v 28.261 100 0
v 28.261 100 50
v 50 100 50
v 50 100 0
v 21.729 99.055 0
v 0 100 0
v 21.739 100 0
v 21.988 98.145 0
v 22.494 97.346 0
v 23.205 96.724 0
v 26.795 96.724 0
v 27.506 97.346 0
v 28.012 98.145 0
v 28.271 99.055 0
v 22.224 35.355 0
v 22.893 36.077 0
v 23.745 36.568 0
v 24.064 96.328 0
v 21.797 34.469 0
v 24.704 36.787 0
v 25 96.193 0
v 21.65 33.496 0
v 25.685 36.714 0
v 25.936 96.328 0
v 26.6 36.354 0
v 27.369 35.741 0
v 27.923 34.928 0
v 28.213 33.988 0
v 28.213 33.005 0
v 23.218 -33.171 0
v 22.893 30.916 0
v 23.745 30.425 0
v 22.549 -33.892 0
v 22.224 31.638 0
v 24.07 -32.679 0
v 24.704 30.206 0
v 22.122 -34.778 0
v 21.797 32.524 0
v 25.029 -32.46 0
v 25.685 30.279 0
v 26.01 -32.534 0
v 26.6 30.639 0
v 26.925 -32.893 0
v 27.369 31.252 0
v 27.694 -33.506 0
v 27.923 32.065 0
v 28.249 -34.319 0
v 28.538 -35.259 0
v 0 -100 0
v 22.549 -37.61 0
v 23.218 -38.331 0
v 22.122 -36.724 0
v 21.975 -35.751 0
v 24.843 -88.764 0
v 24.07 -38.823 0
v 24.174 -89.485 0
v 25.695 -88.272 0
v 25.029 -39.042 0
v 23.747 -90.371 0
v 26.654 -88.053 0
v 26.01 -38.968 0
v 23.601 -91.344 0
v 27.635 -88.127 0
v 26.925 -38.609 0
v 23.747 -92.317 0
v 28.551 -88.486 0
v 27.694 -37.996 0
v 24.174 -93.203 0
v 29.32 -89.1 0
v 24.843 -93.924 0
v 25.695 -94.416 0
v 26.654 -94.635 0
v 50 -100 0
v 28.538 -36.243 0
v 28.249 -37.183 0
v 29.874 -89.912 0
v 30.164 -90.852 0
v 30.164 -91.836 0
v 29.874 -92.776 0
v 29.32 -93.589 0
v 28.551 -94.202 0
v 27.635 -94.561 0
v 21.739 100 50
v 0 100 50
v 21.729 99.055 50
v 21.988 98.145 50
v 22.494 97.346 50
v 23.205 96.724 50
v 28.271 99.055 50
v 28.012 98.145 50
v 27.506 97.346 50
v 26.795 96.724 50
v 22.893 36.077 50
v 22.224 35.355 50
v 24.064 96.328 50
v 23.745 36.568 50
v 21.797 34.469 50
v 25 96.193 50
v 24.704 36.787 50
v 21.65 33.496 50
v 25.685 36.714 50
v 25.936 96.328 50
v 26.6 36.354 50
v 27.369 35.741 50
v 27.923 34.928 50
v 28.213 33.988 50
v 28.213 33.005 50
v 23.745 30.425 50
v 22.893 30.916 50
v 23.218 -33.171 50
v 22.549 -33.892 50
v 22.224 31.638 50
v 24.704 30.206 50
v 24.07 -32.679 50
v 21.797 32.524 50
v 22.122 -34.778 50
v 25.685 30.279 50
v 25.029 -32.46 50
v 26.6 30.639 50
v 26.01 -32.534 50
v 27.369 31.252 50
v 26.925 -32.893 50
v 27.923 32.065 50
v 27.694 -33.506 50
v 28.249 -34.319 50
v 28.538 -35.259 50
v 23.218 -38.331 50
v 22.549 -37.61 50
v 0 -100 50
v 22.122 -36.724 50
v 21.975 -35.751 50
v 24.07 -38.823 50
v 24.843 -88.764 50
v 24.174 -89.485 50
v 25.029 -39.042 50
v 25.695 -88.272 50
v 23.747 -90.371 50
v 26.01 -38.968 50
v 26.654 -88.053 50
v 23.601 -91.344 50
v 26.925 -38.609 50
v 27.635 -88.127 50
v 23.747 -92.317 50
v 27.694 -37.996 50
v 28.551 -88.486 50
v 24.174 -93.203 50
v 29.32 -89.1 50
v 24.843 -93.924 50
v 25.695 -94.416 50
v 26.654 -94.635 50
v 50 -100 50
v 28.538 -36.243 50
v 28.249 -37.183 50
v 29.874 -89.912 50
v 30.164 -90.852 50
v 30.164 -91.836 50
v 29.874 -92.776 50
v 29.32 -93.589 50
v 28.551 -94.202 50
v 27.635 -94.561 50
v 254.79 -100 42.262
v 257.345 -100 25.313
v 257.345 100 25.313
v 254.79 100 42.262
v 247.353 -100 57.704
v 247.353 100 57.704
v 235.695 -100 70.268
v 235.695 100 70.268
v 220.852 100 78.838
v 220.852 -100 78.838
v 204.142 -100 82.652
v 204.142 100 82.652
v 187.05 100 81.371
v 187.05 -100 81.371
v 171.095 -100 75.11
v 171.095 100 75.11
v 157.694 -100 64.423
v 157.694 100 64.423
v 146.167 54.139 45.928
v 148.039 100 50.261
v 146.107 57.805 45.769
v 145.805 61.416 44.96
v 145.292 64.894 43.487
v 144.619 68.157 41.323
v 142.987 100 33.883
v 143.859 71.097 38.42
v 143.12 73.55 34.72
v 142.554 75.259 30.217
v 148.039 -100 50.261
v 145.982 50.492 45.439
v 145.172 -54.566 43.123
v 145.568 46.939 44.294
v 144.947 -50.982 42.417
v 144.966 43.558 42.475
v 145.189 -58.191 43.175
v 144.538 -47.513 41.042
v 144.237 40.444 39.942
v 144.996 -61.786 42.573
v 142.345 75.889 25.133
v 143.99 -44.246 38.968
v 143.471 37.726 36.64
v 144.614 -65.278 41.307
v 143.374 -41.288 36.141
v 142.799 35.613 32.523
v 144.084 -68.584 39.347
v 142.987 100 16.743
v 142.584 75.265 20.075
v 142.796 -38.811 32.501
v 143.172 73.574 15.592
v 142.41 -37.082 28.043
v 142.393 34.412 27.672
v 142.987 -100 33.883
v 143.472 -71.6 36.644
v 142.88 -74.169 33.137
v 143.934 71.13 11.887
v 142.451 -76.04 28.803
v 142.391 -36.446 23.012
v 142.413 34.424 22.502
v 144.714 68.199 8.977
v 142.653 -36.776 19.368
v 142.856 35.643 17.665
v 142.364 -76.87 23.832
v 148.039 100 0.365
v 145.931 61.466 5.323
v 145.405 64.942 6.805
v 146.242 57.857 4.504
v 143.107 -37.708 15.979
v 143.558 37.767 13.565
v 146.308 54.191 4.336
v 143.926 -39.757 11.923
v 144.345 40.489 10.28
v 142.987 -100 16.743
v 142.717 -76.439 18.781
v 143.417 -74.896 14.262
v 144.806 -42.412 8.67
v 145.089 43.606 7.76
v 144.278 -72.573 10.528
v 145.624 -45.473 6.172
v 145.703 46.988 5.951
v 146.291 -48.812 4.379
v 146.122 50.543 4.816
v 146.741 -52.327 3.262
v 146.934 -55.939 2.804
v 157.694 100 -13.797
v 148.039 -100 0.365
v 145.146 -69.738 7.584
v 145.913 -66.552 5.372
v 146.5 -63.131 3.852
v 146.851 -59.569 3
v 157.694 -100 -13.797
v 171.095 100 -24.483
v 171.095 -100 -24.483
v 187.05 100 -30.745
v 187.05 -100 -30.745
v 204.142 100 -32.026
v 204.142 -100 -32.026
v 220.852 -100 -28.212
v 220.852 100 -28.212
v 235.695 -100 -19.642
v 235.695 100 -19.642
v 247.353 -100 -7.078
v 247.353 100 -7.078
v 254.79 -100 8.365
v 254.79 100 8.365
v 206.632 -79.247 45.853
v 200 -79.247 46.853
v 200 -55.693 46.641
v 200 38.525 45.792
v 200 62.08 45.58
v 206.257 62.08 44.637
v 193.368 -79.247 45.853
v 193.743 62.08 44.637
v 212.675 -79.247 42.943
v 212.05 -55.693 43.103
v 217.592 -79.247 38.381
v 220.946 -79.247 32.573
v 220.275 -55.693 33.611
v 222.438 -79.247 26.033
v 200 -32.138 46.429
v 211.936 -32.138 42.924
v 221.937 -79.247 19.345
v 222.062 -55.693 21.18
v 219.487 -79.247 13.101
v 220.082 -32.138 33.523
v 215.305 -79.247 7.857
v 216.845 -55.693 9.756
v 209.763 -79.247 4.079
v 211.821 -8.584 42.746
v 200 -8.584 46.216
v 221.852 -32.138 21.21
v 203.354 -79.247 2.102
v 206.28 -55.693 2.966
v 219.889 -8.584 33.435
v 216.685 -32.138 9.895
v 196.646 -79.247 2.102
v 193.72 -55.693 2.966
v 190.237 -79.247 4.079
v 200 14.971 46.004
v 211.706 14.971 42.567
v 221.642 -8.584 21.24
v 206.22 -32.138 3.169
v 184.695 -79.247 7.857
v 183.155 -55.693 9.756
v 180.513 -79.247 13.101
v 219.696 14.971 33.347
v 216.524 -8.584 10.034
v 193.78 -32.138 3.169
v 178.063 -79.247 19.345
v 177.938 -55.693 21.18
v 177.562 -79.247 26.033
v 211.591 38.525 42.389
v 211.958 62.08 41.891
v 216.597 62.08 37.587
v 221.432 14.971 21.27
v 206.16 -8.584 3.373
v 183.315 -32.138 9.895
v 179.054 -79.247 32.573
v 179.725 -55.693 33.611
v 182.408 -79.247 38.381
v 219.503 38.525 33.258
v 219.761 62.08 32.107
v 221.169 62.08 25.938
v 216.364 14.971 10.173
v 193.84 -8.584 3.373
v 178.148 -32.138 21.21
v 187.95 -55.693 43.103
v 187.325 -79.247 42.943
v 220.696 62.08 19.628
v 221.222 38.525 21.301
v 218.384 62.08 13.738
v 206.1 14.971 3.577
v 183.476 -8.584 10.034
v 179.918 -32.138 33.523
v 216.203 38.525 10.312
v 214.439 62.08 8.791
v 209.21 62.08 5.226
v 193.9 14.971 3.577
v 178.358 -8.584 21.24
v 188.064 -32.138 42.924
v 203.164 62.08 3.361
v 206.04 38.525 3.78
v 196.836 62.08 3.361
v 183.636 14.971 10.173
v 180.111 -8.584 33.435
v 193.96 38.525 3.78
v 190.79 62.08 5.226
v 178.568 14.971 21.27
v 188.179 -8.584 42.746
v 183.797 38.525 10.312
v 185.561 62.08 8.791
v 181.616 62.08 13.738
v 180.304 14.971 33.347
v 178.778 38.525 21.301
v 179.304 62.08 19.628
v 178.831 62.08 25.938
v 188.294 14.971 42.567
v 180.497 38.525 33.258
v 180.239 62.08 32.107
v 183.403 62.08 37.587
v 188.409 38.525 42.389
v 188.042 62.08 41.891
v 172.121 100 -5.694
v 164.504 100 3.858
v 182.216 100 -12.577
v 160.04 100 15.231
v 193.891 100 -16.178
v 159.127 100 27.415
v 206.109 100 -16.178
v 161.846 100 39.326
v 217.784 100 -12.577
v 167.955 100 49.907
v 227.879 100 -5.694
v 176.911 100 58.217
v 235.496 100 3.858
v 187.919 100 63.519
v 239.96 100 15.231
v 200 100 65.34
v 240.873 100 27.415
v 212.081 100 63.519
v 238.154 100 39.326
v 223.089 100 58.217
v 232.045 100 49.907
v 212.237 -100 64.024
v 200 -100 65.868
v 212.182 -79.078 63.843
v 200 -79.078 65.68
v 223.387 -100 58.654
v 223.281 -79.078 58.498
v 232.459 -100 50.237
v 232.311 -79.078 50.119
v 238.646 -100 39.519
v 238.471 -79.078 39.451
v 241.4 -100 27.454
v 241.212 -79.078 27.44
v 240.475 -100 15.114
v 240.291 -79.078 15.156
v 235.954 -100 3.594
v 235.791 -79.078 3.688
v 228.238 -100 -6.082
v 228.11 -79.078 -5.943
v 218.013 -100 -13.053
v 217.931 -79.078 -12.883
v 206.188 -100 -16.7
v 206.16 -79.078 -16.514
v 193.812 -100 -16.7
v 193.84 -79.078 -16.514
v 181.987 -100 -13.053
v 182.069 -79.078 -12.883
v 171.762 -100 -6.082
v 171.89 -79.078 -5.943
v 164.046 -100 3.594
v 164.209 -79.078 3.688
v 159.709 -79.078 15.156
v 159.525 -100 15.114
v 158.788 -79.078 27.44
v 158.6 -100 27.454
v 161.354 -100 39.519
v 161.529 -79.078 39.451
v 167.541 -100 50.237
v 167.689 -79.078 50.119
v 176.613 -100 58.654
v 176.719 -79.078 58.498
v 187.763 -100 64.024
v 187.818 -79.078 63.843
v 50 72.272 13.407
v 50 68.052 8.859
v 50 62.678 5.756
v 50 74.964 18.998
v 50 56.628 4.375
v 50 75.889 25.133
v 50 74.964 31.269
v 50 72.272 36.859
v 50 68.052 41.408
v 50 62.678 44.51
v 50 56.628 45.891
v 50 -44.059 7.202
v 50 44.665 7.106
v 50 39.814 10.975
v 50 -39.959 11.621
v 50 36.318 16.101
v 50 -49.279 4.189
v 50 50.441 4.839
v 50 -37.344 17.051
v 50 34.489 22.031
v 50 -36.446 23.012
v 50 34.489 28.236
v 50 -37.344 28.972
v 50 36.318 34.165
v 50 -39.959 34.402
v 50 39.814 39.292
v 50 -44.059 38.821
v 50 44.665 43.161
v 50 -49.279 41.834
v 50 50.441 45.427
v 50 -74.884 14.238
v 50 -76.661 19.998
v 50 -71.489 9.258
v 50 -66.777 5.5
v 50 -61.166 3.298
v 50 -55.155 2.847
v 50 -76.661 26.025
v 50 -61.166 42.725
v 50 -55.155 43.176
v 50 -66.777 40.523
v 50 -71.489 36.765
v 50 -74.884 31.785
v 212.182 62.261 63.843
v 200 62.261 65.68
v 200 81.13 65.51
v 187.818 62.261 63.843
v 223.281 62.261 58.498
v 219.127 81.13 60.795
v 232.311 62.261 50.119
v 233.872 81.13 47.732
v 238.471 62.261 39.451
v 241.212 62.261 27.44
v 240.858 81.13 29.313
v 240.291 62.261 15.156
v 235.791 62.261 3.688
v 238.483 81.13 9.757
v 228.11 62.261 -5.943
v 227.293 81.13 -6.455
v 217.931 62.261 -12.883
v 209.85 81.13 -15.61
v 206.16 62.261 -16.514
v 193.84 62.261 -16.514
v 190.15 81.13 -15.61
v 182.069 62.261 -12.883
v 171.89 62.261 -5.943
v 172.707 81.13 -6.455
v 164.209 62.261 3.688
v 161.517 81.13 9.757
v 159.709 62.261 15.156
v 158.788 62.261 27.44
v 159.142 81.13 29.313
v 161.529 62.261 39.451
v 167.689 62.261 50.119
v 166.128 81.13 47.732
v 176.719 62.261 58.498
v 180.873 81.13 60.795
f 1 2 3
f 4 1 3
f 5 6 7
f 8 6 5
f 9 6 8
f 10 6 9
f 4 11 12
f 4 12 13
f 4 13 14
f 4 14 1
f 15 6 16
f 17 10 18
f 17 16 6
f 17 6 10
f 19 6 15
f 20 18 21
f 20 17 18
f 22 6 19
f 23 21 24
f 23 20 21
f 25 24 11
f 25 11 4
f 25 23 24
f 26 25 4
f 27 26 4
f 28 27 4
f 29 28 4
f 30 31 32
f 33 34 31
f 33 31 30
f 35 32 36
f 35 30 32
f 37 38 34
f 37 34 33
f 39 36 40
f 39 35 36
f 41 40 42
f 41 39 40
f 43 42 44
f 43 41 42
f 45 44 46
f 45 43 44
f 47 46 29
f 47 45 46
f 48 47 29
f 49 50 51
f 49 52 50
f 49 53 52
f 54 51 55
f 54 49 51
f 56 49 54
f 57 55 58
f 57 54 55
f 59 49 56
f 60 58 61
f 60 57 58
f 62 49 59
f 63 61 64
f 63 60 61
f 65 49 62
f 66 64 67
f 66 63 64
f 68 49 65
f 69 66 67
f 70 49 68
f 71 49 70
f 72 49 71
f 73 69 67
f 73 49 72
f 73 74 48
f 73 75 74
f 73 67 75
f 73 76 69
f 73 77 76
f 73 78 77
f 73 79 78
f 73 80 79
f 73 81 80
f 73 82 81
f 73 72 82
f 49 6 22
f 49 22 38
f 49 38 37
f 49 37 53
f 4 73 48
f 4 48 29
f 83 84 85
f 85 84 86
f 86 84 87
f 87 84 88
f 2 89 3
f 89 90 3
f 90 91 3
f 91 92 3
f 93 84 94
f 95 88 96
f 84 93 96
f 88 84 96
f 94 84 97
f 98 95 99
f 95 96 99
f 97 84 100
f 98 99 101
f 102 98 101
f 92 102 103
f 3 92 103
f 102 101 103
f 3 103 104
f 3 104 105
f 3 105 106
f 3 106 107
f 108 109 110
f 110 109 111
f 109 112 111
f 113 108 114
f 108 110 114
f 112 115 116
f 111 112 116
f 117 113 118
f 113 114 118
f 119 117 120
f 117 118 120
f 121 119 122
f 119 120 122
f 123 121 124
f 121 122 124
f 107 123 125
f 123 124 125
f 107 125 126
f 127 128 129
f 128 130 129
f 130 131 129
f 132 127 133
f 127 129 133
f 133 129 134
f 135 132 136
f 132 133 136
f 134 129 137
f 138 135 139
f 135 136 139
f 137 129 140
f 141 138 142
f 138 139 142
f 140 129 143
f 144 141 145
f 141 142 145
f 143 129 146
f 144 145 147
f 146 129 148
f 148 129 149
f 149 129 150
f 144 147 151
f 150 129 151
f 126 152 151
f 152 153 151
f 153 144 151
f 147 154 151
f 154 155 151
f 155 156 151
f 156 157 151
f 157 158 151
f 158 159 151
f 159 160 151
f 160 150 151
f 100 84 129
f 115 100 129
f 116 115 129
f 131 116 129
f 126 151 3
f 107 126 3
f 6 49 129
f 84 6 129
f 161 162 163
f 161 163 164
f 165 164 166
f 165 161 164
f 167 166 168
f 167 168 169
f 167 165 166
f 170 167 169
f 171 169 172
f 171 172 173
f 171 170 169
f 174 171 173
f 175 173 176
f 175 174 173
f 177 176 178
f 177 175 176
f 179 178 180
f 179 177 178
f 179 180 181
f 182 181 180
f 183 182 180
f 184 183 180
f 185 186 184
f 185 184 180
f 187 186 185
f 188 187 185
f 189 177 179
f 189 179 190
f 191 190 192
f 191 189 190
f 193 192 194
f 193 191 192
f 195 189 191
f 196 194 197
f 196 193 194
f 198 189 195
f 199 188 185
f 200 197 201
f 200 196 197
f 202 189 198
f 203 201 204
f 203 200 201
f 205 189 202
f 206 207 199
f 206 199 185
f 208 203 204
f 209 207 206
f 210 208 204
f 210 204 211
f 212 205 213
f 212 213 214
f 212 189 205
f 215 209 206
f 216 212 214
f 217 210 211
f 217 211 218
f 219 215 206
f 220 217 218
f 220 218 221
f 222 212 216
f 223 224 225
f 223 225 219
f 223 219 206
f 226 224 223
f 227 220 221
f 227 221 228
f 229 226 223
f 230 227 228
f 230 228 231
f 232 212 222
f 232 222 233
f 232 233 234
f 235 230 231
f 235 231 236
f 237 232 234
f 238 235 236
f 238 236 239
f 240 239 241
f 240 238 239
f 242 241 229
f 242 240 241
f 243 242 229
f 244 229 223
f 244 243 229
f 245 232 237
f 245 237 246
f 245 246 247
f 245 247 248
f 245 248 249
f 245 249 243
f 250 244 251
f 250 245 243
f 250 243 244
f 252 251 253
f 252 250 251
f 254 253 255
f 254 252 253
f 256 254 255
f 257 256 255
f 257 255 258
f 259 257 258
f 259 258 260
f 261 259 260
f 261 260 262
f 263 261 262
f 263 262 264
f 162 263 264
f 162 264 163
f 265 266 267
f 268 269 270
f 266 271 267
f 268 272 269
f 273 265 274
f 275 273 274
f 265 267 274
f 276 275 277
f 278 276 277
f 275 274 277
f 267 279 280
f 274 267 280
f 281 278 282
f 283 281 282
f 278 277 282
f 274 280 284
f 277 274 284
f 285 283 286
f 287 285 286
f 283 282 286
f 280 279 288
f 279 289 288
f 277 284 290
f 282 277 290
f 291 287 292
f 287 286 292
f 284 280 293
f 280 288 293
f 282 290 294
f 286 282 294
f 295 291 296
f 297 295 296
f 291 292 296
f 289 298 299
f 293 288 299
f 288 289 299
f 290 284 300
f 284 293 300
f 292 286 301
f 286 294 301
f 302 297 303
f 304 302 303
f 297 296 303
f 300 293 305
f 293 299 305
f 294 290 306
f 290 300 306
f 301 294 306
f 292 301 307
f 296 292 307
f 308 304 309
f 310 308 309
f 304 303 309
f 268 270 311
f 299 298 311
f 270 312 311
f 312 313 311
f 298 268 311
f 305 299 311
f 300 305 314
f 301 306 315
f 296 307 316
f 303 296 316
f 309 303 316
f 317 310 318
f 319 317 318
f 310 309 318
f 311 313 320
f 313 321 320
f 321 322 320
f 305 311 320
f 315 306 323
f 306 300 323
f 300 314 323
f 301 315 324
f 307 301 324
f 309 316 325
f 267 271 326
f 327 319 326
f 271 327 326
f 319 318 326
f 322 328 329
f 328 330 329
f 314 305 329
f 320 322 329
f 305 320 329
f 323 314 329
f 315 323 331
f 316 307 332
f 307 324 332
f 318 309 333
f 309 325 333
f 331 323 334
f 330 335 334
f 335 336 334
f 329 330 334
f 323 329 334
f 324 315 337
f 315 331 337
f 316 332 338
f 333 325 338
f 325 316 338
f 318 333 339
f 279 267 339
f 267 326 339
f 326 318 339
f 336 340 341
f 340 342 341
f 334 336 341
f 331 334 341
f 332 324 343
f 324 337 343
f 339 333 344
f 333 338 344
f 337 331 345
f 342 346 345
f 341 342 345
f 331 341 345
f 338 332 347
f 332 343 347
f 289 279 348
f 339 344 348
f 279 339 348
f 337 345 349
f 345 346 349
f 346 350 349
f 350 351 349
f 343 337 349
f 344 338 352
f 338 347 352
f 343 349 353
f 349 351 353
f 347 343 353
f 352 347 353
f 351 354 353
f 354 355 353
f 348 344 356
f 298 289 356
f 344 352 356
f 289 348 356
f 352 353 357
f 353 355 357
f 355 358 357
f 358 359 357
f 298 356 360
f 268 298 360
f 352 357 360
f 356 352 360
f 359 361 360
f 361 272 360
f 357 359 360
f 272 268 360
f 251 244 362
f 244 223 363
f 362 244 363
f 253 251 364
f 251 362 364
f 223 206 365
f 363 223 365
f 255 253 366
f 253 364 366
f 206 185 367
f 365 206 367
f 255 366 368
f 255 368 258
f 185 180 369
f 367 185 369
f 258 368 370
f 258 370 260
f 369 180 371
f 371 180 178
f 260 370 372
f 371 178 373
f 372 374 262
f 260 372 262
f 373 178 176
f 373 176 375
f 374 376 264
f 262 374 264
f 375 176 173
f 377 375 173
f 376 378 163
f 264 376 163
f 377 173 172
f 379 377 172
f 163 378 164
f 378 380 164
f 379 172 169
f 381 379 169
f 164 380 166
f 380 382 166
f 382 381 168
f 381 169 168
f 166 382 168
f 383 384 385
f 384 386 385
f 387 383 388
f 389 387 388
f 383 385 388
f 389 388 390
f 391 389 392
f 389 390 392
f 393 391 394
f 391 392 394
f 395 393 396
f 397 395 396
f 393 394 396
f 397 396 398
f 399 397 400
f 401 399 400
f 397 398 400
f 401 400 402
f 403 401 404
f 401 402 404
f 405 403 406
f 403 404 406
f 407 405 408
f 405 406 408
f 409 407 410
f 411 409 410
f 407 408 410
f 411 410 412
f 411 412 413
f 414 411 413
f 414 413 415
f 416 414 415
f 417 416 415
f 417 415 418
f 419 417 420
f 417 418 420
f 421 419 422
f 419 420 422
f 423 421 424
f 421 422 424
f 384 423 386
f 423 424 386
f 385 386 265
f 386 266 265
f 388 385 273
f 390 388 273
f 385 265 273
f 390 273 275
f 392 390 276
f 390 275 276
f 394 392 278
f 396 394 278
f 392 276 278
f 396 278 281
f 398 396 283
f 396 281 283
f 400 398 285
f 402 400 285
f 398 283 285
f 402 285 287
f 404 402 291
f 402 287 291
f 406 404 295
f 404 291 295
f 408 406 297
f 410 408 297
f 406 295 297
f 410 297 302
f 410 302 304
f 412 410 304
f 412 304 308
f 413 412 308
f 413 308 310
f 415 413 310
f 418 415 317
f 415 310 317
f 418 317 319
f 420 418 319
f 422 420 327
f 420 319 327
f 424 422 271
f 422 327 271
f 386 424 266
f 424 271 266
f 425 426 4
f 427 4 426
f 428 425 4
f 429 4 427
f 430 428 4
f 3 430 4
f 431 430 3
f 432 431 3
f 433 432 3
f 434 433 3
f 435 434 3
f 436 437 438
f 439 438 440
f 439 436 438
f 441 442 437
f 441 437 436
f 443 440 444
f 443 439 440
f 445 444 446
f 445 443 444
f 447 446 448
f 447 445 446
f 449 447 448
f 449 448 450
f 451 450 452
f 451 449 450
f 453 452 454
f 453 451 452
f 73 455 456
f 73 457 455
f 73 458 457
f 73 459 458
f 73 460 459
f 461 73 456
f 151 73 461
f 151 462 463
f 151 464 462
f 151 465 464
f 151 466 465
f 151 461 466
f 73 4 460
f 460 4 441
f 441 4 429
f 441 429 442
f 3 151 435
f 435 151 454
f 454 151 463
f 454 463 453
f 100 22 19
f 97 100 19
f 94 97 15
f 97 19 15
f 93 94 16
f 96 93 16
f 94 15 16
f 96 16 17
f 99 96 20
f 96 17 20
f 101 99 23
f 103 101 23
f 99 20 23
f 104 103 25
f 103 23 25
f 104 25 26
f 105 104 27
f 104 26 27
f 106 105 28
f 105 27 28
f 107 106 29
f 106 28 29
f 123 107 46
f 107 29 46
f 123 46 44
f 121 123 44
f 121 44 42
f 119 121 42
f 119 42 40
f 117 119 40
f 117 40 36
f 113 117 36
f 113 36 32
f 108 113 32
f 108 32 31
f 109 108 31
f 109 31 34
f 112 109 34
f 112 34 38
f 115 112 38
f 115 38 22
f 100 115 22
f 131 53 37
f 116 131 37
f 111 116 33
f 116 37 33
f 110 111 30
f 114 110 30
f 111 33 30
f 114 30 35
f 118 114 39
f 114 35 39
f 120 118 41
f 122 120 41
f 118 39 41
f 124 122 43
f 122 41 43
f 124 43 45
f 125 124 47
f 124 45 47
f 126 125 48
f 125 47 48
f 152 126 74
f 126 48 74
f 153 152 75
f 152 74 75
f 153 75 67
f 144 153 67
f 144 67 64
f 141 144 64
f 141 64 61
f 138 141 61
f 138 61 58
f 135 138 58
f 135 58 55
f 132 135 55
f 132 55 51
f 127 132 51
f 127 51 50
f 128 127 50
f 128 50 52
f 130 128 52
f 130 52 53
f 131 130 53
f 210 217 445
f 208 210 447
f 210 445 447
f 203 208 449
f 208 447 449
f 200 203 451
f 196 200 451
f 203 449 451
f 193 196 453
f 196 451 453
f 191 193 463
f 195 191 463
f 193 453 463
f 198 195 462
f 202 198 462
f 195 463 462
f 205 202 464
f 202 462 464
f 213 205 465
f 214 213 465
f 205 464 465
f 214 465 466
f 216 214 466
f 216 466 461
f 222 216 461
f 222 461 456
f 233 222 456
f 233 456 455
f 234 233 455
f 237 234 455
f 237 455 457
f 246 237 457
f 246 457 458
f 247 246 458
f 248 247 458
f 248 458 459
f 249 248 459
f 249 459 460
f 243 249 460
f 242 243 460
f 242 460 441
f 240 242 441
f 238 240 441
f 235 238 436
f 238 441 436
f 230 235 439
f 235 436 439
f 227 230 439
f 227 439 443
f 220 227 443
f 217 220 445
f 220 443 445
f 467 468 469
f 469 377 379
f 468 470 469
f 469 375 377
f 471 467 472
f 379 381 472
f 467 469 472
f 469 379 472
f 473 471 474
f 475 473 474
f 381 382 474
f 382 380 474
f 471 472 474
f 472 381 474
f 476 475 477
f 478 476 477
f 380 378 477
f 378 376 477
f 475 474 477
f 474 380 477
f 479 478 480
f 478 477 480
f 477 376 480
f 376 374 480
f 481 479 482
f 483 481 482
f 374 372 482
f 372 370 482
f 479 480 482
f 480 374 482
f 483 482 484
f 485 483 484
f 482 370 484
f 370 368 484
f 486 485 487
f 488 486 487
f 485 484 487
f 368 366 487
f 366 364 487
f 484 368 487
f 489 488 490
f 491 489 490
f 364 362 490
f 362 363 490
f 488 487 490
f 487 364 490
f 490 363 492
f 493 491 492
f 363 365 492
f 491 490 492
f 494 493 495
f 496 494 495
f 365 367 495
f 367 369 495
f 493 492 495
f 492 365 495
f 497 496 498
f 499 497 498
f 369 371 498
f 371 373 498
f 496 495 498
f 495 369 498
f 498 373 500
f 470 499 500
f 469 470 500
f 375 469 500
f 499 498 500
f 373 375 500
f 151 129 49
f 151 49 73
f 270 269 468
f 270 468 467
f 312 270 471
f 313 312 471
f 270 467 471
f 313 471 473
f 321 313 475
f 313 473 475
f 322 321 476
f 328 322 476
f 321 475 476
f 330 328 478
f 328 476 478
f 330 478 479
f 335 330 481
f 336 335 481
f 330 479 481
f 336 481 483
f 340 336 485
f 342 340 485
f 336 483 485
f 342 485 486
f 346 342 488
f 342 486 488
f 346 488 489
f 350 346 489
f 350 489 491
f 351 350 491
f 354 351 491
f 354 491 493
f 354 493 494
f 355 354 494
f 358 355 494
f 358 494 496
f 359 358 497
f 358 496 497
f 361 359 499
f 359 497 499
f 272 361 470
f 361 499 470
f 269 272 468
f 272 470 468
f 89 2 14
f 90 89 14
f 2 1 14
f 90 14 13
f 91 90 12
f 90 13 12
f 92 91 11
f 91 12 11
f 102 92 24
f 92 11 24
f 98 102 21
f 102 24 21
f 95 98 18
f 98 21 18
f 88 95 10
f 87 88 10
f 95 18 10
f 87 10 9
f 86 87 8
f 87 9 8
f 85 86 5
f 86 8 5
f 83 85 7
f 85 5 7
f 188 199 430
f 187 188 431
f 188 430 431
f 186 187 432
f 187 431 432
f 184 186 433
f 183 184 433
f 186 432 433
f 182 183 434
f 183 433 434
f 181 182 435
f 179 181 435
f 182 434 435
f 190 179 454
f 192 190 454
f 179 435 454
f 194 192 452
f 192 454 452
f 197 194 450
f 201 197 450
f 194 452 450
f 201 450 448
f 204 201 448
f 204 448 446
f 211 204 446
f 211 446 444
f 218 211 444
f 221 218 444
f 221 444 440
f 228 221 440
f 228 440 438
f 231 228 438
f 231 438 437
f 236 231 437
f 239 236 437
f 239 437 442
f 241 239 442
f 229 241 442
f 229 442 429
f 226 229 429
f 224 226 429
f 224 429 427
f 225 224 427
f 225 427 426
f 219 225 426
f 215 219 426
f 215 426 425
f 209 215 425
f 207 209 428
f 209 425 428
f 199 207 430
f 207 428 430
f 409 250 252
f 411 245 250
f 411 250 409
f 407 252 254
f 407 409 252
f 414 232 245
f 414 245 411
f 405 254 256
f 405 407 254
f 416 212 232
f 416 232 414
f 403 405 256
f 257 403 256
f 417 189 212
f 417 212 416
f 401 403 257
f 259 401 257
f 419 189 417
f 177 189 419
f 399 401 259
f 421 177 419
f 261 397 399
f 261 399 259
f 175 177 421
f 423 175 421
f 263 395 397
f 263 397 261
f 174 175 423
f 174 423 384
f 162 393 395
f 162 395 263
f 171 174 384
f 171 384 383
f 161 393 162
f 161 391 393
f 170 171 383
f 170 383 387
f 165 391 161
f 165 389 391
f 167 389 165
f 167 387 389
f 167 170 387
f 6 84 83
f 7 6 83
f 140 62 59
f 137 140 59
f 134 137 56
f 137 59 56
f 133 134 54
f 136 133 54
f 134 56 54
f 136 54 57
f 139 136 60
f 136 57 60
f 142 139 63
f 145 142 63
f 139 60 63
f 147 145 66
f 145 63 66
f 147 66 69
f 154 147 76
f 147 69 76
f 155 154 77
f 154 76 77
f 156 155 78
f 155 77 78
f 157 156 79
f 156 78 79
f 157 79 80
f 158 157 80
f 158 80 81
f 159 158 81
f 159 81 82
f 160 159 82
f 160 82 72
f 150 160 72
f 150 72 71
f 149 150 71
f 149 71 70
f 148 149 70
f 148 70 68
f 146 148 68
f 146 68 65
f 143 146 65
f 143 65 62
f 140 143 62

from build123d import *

# Parameters (mm, degrees)
F0_W     = 50
F0_H     = 50
F1_DEPTH = 100
F3_D     = 6.6
F4_R     = 20.2206931271
F4_R_2   = 20.8160873388
F5_DEPTH = 150
F6_R     = 57.5
F7_DEPTH = 100


with BuildPart() as f1:
    # F0 (on Front) → F1 (new body, symmetric)
    with BuildSketch(Plane.XZ):
        with Locations((25, 25)):
            Rectangle(F0_W, F0_H)
    extrude(amount=F1_DEPTH, both=True)

    # F3 (through all)
    with Locations(Plane.XY.offset(50)):
        with Locations((25, 99.4929849688), (24.9502013015, 33.496488903), (25.2753126699, -35.7510662615), (26.9008440388, -91.3441732113)):
            Hole(F3_D / 2)

    # F4 (on face) → F5 (join)
    with BuildSketch(Plane.YZ.offset(50)):
        with Locations((-56.6662251949, 23.0115242302)):
            Circle(F4_R)
        with Locations((55.072888732, 25.1332446933)):
            Circle(F4_R_2)
    extrude(amount=F5_DEPTH)

    # F6 (on Front) → F7 (join, symmetric)
    with BuildSketch(Plane.XZ):
        with Locations((199.8447626829, 25.3131054342)):
            Circle(F6_R)
    extrude(amount=F7_DEPTH, both=True)

    # F9 (on offset) → F10 (revolve, cut)
    with BuildSketch(Plane(origin=(200, 0, 0), x_dir=(0, -1, 0), z_dir=(-1, 0, 0))):
        Polygon((-105.5897921324, 24.3519060314), (100.8795276284, 24.3519060314), (101.4911159873, 24.6927142143), (105.1713102595, 25.4731605558), (104.8070022361, 65.9113094268), (79.0776162995, 65.679512918), (79.2472240509, 46.8530719335), (-62.0798177726, 45.5798540268), (-62.2608959675, 65.679512918), (-105.5897921324, 65.2891620994), align=None)
    revolve(axis=Axis((200, 2.355132252, 24.3519060314), (0, 1, 0)), mode=Mode.SUBTRACT)


solid = f1.part
